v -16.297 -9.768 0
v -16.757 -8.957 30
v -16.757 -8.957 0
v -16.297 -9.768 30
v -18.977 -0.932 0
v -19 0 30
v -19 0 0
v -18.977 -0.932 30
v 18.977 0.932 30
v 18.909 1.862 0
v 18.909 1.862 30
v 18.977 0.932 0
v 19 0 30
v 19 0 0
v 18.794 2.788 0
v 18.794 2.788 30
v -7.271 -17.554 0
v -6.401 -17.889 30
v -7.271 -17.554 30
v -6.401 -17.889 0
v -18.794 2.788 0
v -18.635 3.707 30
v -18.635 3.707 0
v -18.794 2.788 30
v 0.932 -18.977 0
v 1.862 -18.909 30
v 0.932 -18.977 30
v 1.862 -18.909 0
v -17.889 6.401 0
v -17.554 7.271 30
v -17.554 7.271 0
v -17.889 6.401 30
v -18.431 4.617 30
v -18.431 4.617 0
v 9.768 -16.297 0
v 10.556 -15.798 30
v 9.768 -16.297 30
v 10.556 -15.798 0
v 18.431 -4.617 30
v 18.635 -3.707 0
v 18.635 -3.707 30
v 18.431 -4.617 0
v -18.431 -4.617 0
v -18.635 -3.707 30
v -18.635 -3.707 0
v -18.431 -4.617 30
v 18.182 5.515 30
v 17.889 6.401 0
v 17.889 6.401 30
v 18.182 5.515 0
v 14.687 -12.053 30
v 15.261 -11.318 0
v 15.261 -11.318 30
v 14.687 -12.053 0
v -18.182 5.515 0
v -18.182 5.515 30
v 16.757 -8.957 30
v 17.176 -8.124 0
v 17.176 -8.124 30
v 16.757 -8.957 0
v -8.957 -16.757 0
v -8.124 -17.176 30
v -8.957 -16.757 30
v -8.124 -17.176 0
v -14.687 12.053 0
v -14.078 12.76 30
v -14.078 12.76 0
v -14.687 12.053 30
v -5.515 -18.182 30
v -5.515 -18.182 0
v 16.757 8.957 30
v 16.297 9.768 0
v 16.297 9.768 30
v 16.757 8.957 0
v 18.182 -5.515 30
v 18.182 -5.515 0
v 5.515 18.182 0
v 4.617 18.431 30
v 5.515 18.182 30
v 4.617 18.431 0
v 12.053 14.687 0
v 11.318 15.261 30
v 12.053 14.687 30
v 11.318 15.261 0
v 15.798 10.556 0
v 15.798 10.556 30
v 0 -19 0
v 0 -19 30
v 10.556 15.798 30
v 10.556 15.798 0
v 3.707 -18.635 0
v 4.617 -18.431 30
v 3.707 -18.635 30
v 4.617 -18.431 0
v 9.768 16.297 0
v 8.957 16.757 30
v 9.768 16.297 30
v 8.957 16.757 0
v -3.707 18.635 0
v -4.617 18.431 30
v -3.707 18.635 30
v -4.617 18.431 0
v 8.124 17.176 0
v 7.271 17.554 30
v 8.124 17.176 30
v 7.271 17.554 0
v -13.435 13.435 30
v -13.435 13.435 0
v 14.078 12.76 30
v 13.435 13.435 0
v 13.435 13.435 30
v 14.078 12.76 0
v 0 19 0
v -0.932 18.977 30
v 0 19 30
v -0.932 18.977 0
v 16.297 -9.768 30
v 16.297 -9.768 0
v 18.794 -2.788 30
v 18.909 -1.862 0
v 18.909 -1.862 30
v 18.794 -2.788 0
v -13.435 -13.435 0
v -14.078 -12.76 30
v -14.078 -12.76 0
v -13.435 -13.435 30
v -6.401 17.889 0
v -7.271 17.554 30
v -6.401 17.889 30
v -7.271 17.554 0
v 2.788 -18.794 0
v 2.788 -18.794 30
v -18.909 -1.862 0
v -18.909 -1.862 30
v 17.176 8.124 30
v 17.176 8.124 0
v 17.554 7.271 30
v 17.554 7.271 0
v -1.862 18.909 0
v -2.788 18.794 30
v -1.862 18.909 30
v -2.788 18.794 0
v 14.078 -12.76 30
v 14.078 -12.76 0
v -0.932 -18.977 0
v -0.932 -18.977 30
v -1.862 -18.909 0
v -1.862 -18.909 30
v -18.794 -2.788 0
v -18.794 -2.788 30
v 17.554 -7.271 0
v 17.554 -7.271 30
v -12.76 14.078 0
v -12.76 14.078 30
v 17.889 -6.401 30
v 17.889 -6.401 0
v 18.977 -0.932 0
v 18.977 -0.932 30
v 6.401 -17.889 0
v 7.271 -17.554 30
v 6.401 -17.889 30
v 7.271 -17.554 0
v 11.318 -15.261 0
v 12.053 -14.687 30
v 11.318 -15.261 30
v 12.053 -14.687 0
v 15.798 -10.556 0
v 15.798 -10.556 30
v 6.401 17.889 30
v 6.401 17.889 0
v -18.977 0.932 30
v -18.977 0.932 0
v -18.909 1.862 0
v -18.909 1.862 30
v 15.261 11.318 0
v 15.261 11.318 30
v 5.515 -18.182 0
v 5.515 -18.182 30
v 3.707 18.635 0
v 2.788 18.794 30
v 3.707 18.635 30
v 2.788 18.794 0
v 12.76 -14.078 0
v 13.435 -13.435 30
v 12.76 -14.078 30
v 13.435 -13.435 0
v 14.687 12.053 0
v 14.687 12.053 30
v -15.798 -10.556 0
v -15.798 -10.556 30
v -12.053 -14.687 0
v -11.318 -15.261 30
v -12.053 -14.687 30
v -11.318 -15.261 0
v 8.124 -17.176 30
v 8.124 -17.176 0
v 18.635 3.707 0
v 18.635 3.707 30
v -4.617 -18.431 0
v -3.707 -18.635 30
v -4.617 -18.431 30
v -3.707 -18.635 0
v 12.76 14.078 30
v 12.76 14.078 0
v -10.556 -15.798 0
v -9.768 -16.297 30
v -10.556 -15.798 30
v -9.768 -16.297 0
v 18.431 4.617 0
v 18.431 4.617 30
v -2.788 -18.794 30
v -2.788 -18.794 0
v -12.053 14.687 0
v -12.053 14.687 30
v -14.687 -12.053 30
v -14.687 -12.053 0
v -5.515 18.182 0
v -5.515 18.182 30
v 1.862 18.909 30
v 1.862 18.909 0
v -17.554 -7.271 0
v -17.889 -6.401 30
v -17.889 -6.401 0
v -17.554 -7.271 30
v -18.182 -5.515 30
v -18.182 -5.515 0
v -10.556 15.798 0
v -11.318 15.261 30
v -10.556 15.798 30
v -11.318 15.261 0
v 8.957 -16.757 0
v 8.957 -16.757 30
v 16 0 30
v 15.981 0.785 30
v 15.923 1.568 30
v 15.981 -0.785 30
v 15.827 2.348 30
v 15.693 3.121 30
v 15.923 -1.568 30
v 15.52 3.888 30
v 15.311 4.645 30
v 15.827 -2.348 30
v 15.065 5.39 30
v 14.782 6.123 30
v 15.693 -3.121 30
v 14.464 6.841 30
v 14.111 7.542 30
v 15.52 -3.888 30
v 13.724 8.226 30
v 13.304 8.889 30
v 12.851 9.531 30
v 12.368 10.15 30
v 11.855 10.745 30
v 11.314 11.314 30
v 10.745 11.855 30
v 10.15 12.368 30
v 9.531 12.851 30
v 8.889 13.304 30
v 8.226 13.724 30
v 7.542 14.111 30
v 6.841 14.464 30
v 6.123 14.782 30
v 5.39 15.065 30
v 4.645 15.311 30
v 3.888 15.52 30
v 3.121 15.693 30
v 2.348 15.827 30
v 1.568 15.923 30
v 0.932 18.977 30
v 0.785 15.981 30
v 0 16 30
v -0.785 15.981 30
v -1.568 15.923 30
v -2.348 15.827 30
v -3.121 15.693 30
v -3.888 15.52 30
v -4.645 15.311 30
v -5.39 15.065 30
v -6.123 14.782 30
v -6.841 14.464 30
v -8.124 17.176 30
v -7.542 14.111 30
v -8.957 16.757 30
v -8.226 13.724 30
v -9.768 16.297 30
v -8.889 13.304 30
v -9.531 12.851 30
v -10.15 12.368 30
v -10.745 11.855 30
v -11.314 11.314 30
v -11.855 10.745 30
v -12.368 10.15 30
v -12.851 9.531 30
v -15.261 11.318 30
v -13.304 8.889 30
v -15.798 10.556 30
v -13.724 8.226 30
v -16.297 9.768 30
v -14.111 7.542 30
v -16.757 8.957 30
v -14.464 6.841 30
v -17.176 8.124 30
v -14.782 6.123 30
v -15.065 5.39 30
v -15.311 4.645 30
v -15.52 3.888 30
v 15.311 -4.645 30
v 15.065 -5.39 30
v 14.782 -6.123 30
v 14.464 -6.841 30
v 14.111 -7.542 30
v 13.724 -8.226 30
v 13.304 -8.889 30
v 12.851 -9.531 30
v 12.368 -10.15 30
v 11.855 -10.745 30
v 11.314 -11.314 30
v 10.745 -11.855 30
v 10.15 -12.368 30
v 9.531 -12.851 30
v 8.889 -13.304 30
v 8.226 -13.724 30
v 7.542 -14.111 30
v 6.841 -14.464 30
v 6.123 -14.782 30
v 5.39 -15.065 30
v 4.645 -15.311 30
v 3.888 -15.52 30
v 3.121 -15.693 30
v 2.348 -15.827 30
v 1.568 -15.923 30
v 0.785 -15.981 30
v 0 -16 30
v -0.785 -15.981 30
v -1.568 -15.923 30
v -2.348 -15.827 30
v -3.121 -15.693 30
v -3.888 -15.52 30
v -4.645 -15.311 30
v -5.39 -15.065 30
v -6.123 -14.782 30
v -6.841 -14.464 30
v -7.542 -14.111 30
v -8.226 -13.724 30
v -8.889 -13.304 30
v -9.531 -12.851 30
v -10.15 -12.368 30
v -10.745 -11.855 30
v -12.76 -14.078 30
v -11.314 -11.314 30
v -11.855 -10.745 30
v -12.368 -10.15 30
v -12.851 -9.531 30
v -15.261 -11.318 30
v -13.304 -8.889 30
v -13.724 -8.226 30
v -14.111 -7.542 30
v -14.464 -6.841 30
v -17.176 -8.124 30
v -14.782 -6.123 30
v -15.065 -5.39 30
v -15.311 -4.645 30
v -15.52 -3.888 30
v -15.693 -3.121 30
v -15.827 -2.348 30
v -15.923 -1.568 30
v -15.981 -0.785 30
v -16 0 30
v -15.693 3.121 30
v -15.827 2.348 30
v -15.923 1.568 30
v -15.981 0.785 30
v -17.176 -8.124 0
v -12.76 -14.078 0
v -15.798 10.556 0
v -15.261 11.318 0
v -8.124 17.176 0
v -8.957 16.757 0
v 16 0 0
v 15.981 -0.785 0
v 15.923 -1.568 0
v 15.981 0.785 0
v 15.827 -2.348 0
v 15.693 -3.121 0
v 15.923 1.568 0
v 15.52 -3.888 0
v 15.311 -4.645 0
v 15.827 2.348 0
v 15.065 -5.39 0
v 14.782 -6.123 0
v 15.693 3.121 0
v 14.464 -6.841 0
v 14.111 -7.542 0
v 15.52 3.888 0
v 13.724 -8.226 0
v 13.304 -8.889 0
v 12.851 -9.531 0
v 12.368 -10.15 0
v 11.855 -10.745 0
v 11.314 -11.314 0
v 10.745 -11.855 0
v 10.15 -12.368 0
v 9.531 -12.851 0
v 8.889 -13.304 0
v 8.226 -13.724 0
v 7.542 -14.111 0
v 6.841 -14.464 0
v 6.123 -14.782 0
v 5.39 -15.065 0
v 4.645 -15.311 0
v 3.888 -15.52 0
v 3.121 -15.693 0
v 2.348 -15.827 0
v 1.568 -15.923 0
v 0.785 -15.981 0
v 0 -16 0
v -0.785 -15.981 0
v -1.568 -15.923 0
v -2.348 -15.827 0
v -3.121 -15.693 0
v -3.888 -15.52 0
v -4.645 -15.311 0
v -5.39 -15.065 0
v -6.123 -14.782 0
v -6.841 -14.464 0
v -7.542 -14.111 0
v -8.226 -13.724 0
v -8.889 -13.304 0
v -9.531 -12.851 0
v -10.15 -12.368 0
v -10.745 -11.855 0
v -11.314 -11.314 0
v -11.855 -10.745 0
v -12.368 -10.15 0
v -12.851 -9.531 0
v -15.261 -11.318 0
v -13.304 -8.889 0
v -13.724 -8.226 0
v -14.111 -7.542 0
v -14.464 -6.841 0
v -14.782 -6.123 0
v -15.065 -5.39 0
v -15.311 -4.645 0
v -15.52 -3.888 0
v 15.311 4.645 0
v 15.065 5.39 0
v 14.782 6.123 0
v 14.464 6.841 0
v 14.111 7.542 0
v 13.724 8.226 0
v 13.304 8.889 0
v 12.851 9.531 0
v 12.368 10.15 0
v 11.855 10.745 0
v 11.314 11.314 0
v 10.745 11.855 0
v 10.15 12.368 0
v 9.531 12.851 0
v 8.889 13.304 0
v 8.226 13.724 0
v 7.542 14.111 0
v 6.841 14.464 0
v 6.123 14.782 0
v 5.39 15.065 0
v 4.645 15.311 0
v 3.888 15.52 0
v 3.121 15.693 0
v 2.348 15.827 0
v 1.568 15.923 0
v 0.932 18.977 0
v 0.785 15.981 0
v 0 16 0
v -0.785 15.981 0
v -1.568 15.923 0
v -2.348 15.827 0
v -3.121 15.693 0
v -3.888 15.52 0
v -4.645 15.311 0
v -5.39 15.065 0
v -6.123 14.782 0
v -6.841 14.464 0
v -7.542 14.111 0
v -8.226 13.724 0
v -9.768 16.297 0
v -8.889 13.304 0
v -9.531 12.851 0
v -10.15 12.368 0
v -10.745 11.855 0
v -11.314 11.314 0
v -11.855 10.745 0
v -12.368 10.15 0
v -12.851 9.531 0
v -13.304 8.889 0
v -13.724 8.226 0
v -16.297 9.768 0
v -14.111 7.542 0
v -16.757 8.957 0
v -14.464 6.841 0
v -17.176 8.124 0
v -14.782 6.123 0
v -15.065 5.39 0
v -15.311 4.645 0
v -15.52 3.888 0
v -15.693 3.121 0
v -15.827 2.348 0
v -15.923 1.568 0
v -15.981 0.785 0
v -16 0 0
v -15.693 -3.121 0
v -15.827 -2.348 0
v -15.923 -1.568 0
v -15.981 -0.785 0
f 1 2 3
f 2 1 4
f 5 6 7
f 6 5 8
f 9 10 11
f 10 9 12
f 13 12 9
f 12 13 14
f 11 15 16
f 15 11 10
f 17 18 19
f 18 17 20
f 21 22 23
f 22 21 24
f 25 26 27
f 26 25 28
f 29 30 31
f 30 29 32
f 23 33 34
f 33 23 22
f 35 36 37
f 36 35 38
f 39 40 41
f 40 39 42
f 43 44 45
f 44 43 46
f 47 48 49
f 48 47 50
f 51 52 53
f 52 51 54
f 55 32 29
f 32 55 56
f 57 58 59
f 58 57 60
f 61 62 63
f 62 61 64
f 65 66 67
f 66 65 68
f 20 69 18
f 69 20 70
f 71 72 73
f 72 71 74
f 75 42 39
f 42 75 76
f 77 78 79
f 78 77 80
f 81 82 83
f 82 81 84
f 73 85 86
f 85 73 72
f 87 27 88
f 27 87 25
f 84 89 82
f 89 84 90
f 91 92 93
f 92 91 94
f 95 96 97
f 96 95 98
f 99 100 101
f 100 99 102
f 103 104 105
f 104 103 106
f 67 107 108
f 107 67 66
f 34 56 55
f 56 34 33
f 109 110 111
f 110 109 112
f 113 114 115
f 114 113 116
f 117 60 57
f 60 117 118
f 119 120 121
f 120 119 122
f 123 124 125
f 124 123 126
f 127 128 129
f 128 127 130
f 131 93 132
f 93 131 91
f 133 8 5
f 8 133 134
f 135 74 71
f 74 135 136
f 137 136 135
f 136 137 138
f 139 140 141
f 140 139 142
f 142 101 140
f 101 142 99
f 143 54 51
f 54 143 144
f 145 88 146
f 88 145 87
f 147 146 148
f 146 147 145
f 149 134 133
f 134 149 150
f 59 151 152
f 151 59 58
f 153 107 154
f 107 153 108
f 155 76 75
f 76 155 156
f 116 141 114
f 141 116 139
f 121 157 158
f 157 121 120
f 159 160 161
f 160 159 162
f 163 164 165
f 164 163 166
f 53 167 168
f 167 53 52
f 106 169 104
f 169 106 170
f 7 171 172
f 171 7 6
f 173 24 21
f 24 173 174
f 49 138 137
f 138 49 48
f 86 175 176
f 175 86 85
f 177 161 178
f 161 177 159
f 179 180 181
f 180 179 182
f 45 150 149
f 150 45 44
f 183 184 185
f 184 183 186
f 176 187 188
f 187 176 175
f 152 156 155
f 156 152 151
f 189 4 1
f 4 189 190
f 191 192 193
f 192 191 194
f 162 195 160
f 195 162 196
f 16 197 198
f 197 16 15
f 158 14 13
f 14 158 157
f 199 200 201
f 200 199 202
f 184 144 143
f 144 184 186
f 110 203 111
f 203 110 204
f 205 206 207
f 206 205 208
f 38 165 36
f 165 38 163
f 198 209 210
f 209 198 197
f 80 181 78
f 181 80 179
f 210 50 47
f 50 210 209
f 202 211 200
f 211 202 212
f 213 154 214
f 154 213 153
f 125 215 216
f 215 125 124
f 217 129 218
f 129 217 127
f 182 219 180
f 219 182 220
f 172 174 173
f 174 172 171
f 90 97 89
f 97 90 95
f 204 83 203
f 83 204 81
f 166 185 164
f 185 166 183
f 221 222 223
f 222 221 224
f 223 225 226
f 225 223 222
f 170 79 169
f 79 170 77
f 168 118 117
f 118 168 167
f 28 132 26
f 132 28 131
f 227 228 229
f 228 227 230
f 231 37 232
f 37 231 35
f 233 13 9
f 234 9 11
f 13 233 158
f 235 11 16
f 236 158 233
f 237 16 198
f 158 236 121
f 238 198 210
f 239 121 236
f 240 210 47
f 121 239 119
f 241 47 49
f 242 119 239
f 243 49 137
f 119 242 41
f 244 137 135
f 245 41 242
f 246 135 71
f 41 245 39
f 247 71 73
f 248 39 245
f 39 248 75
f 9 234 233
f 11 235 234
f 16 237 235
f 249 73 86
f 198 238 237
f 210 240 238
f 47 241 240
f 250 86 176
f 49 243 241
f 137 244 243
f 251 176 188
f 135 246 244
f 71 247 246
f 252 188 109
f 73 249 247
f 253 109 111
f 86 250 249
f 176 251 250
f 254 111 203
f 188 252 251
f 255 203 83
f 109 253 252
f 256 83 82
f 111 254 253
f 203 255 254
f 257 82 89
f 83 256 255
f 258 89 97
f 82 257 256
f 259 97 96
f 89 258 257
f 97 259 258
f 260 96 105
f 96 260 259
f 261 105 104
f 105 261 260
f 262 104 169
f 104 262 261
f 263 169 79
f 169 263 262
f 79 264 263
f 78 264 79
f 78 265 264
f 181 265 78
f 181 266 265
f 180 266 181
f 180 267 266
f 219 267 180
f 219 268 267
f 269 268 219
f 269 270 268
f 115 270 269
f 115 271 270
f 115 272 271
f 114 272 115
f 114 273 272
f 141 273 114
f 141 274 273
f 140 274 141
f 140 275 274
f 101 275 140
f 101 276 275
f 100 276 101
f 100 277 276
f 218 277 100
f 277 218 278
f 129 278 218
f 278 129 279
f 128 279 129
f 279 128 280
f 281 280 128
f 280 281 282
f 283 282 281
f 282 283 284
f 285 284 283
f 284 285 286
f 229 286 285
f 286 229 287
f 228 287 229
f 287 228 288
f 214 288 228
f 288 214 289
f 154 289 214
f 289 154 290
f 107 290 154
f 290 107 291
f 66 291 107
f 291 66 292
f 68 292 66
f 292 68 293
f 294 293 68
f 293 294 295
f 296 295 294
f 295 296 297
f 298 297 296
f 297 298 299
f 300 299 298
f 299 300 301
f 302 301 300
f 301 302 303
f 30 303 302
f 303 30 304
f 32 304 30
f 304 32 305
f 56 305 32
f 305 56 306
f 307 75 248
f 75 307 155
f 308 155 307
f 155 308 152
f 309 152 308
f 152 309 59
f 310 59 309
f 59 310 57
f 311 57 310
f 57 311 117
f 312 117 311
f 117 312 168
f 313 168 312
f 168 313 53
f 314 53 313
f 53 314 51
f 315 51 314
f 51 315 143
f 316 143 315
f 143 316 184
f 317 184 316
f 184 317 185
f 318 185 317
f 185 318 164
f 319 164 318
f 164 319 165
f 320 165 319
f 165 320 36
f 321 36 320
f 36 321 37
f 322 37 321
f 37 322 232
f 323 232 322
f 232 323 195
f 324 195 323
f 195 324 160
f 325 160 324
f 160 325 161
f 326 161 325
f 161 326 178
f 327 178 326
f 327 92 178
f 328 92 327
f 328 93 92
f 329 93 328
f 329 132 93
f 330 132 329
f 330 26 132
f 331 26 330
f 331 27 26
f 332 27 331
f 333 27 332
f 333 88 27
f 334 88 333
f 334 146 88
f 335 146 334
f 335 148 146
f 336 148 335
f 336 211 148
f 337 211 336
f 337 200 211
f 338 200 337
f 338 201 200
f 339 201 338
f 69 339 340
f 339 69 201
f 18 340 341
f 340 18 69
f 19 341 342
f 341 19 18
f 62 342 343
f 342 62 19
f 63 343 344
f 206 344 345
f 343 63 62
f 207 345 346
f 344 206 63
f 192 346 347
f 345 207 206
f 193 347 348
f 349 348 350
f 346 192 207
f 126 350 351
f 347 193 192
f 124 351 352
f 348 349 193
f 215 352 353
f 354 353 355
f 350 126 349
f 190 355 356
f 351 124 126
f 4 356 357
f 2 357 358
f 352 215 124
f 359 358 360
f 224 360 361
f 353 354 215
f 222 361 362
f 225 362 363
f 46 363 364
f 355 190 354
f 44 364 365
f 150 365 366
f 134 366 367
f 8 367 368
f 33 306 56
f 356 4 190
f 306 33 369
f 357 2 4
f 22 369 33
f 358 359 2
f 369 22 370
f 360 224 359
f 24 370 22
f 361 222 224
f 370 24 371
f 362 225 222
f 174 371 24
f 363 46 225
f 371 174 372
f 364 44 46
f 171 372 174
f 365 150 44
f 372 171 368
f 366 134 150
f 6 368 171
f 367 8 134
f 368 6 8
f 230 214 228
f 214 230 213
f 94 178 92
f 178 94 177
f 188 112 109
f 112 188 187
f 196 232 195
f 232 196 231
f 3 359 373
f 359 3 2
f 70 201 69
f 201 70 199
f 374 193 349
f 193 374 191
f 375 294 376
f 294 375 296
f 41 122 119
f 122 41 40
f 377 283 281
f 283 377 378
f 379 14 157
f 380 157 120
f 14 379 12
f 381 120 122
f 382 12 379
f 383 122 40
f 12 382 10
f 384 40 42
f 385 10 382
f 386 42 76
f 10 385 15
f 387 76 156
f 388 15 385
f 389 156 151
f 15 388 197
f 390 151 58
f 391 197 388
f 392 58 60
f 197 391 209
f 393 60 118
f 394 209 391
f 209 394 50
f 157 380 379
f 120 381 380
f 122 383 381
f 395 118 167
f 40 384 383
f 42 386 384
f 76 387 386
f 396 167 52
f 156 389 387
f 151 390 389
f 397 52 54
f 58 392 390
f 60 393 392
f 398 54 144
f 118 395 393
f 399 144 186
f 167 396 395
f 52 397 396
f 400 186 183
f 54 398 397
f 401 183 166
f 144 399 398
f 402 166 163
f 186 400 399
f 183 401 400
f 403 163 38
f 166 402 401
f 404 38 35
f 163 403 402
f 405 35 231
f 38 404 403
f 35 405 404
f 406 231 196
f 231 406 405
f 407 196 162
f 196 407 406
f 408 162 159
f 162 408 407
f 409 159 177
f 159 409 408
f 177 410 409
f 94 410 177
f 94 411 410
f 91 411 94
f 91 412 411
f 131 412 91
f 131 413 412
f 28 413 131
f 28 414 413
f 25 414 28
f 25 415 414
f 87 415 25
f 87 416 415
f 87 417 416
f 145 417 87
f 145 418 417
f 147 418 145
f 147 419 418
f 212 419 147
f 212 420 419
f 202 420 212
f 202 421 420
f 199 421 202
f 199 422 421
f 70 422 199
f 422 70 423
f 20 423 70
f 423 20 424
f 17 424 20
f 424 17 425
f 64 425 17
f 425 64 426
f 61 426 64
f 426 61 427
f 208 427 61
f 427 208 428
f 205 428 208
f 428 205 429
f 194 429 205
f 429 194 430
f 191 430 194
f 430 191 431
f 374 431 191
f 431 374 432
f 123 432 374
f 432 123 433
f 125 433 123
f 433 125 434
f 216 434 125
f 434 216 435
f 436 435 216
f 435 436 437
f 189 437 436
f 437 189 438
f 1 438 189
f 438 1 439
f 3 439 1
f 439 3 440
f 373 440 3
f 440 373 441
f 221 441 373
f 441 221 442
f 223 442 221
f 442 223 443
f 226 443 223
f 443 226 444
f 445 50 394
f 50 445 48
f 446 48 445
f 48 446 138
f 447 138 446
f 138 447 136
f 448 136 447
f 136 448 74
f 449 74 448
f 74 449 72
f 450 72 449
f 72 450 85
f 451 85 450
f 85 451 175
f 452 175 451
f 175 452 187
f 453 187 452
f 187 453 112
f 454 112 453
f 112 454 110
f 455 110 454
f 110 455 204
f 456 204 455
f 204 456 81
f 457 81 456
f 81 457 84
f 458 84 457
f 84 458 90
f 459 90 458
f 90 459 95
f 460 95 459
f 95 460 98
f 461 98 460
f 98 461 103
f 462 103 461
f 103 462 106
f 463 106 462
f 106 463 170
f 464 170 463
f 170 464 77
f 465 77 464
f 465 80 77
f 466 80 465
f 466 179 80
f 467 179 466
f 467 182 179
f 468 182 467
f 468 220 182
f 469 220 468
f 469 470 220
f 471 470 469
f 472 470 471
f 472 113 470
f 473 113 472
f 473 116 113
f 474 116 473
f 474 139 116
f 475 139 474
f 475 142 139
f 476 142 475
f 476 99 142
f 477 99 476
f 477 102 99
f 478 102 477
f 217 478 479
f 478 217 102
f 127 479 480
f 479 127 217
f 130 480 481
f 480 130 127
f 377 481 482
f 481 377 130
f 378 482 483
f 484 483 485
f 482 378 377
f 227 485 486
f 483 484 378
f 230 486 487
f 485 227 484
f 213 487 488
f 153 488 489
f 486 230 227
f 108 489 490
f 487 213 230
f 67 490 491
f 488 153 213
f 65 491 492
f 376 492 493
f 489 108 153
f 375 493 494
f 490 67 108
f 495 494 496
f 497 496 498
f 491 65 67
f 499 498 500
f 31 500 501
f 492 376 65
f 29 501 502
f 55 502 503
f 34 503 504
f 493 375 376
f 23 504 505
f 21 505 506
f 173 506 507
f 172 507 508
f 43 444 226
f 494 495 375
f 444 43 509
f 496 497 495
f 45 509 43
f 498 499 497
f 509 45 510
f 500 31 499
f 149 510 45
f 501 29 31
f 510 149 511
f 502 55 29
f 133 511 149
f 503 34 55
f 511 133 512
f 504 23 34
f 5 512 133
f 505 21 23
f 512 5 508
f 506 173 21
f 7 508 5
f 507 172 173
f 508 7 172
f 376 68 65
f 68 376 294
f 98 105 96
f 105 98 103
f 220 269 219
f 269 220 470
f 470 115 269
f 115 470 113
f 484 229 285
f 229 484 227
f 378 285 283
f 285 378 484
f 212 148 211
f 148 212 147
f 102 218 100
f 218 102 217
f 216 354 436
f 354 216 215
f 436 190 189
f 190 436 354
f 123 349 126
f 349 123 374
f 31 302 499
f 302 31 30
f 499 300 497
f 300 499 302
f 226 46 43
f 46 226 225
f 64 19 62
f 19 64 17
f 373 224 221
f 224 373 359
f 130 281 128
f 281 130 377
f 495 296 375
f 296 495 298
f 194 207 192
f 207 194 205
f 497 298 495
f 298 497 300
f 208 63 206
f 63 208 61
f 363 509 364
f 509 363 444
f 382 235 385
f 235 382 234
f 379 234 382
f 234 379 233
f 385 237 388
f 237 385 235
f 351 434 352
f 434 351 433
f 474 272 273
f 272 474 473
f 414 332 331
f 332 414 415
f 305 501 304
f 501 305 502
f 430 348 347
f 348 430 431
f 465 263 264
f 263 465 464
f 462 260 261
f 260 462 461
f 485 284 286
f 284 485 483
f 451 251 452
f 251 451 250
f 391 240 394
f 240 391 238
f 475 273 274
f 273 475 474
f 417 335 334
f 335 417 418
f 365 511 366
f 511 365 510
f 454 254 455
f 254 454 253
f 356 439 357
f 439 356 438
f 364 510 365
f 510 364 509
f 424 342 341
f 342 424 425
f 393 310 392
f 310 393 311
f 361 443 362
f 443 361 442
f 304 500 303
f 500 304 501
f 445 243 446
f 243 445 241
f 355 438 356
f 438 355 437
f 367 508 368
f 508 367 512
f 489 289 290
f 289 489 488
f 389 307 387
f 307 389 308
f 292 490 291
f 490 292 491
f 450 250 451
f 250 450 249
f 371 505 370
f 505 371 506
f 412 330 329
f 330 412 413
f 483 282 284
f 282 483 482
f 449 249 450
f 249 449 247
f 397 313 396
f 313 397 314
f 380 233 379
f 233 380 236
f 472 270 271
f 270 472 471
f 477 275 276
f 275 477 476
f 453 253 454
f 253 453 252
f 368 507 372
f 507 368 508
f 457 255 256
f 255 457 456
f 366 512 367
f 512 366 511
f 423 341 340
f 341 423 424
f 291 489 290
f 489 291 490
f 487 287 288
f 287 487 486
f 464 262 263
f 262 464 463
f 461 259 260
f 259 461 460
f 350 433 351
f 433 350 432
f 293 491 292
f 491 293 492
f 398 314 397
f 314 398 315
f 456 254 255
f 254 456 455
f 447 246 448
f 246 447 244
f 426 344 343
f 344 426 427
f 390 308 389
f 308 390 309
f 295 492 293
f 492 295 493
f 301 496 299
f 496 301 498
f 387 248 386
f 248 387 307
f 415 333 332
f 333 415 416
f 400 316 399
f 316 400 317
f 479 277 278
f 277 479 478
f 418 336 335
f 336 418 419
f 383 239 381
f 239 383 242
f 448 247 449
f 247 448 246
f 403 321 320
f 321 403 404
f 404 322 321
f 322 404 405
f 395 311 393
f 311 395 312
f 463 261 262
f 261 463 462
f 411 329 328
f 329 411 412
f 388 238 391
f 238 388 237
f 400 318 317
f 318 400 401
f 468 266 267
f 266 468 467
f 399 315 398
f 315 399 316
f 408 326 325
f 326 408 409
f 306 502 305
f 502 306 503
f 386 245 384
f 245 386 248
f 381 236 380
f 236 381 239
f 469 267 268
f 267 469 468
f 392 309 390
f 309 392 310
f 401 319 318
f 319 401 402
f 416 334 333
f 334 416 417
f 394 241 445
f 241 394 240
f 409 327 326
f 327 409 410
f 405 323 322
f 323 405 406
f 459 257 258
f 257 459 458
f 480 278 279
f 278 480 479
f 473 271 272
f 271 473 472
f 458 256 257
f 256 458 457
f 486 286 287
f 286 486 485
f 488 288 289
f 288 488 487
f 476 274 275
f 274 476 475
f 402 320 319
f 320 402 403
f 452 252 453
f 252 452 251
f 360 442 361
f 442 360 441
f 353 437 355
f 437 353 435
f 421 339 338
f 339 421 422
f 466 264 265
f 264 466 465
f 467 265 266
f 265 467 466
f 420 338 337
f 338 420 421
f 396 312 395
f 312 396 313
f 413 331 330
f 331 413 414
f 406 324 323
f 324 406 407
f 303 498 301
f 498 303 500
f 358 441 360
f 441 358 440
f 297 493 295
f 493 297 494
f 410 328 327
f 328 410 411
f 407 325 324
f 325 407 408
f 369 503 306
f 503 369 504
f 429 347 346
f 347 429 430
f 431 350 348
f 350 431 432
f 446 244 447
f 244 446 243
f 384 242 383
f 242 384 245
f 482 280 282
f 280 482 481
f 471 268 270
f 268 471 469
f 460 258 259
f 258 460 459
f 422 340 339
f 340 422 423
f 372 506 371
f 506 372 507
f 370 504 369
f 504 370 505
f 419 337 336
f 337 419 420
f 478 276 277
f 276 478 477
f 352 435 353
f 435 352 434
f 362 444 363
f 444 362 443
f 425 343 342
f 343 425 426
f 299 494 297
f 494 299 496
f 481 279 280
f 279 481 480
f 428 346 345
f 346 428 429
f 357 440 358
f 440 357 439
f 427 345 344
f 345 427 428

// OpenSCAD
// file: ../stub_tube.scad
// A tube standing on the bed with its bore through: what the dust category's
// stand-ins are drawn as, until the real hose and fittings are measured. A
// library the parts include, not a part.
module stub_tube(bore, outer, length) {
    difference() {
        cylinder(h = length, d = outer);
        translate([0, 0, -1]) cylinder(h = length + 2, d = bore);
    }
}
// main file
// A stand-in for a rigid dust port with a 32 mm bore, a tool's or a
// collector's, until one is measured: 30 mm of it, its mouth at the top.

include <../stub_tube.scad>

bore = 32;
outer = 38;
length = 30;
$fn = 128;

stub_tube(bore, outer, length);
